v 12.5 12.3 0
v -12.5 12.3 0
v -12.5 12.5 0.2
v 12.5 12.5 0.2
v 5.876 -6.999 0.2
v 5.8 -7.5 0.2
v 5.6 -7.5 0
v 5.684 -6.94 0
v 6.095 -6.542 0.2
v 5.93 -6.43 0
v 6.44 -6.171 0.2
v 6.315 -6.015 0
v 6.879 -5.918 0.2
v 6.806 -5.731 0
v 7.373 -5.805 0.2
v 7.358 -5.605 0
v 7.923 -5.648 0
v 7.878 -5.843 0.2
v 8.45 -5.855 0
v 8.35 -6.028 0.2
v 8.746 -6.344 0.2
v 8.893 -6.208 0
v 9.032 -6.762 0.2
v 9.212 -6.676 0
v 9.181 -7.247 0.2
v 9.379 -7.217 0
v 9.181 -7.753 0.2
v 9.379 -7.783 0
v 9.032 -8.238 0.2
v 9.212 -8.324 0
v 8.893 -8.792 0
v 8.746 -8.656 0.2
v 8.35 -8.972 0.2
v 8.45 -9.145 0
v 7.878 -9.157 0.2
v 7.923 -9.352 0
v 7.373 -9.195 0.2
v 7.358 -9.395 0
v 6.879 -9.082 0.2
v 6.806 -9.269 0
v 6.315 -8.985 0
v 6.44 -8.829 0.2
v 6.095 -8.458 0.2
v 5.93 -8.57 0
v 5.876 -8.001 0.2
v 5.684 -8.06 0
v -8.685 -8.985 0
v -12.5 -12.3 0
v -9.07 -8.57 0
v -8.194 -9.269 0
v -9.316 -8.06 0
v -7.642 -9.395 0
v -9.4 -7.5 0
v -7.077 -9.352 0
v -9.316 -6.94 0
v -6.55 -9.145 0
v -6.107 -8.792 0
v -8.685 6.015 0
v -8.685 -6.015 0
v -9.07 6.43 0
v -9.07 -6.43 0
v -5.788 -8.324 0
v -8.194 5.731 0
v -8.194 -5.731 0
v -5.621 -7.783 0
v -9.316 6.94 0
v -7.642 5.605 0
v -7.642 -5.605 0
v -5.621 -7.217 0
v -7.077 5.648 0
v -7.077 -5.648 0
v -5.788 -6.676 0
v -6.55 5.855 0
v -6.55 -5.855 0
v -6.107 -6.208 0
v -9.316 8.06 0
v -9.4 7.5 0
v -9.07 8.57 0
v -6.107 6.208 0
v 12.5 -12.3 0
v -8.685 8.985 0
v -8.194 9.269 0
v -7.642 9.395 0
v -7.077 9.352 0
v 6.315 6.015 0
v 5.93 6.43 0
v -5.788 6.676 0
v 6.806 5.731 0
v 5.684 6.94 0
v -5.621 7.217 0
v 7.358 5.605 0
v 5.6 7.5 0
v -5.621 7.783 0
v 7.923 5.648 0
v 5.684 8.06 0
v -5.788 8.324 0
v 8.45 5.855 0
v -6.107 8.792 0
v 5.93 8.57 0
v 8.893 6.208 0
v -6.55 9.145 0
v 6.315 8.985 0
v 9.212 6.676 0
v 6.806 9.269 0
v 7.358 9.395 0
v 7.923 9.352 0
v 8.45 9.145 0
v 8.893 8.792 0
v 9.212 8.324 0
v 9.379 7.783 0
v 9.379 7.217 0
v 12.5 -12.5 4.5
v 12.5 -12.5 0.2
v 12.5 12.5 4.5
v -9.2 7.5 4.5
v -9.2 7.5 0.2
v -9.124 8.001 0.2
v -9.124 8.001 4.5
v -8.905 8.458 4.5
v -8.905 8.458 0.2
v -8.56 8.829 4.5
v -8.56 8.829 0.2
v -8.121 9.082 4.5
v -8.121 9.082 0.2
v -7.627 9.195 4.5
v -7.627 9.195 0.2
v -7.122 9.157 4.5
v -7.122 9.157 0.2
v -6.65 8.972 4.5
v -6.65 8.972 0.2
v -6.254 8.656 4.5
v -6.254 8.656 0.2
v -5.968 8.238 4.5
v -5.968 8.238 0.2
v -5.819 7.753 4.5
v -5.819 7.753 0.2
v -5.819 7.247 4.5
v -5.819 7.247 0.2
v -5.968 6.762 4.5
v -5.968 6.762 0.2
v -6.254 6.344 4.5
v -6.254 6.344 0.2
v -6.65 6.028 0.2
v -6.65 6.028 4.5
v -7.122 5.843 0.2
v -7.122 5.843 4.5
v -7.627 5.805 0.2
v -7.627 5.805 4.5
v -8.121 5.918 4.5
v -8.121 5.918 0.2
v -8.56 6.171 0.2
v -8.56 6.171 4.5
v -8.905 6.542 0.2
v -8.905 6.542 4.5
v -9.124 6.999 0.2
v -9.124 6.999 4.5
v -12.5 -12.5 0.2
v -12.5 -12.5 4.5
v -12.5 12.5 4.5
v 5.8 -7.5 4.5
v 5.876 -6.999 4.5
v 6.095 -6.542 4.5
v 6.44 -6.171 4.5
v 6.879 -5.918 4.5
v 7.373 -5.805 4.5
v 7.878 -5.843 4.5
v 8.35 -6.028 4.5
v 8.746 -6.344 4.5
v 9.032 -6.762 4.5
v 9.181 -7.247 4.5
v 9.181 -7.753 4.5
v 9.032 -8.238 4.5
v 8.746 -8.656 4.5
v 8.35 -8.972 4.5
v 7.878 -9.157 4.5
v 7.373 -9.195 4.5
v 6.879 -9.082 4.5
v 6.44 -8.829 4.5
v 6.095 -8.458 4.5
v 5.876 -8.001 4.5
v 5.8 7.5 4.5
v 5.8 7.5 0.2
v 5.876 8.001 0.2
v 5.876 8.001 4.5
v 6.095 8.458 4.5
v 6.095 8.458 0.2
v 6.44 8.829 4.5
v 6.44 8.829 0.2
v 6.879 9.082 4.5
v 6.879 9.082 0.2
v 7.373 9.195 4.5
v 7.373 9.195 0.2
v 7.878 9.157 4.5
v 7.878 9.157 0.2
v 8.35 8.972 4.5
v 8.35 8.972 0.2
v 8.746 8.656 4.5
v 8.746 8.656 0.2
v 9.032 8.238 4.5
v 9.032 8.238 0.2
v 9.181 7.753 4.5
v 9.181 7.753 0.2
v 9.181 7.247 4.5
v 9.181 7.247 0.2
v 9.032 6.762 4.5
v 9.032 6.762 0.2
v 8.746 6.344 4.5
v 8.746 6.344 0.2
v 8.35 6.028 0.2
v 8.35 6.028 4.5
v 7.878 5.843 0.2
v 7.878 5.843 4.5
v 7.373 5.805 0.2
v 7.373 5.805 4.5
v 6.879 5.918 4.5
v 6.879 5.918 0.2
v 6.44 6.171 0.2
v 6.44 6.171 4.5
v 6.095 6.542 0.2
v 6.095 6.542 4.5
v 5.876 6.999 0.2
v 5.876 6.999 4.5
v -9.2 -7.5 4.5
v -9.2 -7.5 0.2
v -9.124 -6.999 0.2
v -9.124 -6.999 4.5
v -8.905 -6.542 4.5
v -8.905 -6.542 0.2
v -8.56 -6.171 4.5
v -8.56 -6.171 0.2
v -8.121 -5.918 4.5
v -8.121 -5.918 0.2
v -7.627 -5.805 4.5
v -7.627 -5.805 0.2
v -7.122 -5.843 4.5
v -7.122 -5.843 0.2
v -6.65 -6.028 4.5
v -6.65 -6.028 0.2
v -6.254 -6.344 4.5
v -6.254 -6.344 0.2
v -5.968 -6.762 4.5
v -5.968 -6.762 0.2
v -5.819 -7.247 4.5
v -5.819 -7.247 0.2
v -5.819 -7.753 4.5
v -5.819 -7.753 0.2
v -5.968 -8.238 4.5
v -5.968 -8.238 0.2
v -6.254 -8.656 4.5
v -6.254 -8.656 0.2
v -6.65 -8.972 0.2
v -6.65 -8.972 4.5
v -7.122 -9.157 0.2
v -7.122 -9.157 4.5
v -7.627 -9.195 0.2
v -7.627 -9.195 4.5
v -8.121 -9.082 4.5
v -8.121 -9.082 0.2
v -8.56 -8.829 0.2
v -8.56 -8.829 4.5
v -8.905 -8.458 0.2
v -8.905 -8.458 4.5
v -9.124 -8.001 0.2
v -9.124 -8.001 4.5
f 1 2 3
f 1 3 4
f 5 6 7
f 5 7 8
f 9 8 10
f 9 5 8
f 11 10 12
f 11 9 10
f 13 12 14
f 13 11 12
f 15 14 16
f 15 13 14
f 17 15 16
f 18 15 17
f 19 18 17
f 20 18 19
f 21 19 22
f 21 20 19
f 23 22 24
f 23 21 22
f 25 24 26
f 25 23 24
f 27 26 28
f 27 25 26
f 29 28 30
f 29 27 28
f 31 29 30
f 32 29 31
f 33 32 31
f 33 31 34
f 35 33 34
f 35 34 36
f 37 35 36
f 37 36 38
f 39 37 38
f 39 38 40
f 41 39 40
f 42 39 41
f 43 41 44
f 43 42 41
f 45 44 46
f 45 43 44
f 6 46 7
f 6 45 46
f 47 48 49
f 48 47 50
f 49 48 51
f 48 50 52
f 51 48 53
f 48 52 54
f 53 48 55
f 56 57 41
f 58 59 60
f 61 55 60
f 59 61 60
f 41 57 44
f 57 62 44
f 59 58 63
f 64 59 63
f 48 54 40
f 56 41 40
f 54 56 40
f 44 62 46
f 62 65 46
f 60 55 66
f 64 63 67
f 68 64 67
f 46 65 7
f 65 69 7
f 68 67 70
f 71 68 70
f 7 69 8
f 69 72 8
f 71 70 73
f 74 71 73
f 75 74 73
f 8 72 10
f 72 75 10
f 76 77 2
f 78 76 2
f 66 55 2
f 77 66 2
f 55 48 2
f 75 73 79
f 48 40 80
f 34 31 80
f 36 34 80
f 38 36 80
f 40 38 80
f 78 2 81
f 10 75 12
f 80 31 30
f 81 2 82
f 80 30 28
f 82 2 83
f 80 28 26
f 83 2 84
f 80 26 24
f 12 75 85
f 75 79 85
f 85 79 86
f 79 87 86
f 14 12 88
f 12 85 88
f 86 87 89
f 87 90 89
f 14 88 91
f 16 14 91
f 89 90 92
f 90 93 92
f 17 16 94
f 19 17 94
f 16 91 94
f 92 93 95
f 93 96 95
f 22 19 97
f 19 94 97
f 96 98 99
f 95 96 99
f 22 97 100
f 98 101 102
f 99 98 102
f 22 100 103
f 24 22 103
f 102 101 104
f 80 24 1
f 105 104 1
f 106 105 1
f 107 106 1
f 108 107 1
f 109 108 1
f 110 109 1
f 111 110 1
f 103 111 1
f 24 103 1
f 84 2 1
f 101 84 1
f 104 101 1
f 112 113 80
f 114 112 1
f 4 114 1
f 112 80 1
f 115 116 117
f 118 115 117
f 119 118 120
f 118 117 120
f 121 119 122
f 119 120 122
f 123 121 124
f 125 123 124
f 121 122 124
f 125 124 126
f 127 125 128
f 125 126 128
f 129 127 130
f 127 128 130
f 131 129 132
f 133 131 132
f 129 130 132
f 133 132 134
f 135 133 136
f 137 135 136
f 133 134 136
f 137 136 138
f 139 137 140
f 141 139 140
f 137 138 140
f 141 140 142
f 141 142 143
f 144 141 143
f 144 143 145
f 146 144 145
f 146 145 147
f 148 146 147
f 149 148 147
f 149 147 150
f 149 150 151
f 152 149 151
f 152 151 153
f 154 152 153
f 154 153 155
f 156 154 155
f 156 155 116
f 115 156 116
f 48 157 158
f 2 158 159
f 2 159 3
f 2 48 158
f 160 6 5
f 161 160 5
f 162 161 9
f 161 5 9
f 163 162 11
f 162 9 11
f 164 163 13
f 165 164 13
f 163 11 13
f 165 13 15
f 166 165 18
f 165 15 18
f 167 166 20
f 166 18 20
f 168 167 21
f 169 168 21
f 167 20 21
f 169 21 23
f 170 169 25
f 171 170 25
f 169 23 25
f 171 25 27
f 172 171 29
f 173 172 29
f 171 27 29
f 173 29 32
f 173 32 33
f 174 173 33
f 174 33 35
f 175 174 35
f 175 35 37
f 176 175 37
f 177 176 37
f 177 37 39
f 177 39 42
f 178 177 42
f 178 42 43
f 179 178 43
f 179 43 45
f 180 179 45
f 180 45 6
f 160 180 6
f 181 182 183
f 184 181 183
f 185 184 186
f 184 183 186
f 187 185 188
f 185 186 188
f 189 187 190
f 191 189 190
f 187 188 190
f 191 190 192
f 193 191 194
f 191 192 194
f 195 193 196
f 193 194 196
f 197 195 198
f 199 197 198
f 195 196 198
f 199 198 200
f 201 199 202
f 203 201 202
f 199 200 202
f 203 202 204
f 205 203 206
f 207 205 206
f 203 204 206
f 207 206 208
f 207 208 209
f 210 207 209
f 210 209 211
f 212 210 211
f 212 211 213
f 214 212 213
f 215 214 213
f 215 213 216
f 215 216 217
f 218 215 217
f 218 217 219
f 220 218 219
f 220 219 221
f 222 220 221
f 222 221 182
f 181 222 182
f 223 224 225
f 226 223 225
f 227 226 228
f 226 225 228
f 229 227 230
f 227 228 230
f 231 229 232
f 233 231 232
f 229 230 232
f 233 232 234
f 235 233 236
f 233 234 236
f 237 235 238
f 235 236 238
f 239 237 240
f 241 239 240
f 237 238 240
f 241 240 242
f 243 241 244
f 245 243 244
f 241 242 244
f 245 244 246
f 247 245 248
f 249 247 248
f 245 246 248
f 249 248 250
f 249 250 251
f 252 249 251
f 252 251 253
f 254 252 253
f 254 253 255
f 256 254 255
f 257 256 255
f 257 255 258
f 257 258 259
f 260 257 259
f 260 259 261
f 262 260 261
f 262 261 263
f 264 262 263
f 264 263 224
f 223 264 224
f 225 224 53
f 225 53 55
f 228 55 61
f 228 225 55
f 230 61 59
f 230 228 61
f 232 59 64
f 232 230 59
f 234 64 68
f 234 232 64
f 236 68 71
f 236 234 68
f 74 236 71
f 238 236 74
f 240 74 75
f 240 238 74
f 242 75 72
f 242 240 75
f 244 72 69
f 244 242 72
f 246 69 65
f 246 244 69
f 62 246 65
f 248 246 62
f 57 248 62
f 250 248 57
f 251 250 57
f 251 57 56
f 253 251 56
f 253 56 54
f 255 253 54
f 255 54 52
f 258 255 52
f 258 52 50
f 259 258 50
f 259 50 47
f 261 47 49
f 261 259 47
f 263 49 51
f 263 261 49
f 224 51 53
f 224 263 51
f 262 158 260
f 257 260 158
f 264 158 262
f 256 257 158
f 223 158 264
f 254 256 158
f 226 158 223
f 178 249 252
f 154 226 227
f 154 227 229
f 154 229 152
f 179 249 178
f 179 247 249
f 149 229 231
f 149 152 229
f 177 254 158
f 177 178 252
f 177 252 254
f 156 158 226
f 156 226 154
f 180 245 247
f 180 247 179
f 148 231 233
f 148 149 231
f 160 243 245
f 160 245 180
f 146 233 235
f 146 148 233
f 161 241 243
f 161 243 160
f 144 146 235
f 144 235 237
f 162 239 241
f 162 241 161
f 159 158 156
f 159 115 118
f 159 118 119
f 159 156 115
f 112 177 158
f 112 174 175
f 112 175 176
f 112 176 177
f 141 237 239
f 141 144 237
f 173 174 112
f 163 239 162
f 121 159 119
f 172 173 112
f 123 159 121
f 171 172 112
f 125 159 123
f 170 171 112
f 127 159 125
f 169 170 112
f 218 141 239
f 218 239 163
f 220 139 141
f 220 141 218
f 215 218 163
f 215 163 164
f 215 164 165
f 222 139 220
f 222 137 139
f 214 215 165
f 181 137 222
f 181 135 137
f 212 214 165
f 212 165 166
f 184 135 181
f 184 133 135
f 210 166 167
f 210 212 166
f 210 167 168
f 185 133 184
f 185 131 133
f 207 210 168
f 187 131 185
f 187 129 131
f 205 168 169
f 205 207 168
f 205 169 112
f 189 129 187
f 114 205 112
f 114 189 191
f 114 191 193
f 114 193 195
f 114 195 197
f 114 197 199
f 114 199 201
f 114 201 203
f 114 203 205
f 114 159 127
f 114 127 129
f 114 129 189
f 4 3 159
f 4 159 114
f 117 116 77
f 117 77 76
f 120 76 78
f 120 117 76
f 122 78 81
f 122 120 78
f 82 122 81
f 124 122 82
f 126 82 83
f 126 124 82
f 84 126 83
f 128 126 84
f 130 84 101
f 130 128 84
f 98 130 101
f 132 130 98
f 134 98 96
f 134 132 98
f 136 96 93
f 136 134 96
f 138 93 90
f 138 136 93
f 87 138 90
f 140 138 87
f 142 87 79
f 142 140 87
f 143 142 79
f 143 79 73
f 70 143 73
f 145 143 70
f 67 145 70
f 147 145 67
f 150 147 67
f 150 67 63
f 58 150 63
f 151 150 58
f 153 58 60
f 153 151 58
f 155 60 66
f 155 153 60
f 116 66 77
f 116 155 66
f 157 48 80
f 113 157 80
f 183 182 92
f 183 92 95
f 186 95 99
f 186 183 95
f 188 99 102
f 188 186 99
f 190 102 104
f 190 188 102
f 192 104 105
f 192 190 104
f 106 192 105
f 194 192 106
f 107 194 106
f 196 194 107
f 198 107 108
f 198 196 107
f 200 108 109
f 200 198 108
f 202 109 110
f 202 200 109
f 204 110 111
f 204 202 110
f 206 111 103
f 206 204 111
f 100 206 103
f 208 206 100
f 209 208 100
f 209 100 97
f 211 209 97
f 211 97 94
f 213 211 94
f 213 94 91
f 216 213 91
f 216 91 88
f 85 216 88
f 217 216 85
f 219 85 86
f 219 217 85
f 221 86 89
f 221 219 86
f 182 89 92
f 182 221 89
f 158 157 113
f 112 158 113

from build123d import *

# Parameters (mm, degrees)
SKETCH_1_W                  = 25
SKETCH_1_H                  = 25
EXTRUDE_1_DEPTH             = 4.5
SKETCH_2_R                  = 1.7
CUT_EXTRUDE_1_DEPTH         = 19.241436347
PATTERN_LINEAR_1_COUNT      = 2
PATTERN_LINEAR_1_PITCH      = 15
PATTERN_LINEAR_1_COUNT_DIR2 = 2
PATTERN_LINEAR_1_PITCH_DIR2 = 15
CHAMFER_1_SIZE              = 0.2


with BuildPart() as part:
    # 草圖1 → 填料-伸長1 (new body)
    with BuildSketch(Plane.XY):
        Rectangle(SKETCH_1_W, SKETCH_1_H)
    extrude(amount=EXTRUDE_1_DEPTH)

    # 草圖2 → 除料-伸長1 (cut, through all)
    with BuildSketch(Plane(origin=(0, 0, 0), x_dir=(-1, 0, 0), z_dir=(0, 0, -1))):
        with Locations((-7.5, 7.5)):
            Circle(SKETCH_2_R)
    cut_extrude_1 = extrude(amount=-CUT_EXTRUDE_1_DEPTH, mode=Mode.SUBTRACT)

    # 直線複製排列1: Cut-Extrude 1 2 × 2
    with Locations(*[(-i * PATTERN_LINEAR_1_PITCH, -j * PATTERN_LINEAR_1_PITCH_DIR2, 0) for i in range(PATTERN_LINEAR_1_COUNT) for j in range(PATTERN_LINEAR_1_COUNT_DIR2) if (i, j) != (0, 0)]):
        add(cut_extrude_1, mode=Mode.SUBTRACT)

    # 導角1
    chamfer_1_edges = [part.edges().sort_by_distance(p)[0] for p in [
        (9.2, 7.5, 0),
        (-5.8, 7.5, 0),
        (9.2, -7.5, 0),
        (-5.8, -7.5, 0),
        (0, 12.5, 0),
        (0, -12.5, 0),
    ]]
    chamfer(chamfer_1_edges, length=CHAMFER_1_SIZE)


solid = part.part
